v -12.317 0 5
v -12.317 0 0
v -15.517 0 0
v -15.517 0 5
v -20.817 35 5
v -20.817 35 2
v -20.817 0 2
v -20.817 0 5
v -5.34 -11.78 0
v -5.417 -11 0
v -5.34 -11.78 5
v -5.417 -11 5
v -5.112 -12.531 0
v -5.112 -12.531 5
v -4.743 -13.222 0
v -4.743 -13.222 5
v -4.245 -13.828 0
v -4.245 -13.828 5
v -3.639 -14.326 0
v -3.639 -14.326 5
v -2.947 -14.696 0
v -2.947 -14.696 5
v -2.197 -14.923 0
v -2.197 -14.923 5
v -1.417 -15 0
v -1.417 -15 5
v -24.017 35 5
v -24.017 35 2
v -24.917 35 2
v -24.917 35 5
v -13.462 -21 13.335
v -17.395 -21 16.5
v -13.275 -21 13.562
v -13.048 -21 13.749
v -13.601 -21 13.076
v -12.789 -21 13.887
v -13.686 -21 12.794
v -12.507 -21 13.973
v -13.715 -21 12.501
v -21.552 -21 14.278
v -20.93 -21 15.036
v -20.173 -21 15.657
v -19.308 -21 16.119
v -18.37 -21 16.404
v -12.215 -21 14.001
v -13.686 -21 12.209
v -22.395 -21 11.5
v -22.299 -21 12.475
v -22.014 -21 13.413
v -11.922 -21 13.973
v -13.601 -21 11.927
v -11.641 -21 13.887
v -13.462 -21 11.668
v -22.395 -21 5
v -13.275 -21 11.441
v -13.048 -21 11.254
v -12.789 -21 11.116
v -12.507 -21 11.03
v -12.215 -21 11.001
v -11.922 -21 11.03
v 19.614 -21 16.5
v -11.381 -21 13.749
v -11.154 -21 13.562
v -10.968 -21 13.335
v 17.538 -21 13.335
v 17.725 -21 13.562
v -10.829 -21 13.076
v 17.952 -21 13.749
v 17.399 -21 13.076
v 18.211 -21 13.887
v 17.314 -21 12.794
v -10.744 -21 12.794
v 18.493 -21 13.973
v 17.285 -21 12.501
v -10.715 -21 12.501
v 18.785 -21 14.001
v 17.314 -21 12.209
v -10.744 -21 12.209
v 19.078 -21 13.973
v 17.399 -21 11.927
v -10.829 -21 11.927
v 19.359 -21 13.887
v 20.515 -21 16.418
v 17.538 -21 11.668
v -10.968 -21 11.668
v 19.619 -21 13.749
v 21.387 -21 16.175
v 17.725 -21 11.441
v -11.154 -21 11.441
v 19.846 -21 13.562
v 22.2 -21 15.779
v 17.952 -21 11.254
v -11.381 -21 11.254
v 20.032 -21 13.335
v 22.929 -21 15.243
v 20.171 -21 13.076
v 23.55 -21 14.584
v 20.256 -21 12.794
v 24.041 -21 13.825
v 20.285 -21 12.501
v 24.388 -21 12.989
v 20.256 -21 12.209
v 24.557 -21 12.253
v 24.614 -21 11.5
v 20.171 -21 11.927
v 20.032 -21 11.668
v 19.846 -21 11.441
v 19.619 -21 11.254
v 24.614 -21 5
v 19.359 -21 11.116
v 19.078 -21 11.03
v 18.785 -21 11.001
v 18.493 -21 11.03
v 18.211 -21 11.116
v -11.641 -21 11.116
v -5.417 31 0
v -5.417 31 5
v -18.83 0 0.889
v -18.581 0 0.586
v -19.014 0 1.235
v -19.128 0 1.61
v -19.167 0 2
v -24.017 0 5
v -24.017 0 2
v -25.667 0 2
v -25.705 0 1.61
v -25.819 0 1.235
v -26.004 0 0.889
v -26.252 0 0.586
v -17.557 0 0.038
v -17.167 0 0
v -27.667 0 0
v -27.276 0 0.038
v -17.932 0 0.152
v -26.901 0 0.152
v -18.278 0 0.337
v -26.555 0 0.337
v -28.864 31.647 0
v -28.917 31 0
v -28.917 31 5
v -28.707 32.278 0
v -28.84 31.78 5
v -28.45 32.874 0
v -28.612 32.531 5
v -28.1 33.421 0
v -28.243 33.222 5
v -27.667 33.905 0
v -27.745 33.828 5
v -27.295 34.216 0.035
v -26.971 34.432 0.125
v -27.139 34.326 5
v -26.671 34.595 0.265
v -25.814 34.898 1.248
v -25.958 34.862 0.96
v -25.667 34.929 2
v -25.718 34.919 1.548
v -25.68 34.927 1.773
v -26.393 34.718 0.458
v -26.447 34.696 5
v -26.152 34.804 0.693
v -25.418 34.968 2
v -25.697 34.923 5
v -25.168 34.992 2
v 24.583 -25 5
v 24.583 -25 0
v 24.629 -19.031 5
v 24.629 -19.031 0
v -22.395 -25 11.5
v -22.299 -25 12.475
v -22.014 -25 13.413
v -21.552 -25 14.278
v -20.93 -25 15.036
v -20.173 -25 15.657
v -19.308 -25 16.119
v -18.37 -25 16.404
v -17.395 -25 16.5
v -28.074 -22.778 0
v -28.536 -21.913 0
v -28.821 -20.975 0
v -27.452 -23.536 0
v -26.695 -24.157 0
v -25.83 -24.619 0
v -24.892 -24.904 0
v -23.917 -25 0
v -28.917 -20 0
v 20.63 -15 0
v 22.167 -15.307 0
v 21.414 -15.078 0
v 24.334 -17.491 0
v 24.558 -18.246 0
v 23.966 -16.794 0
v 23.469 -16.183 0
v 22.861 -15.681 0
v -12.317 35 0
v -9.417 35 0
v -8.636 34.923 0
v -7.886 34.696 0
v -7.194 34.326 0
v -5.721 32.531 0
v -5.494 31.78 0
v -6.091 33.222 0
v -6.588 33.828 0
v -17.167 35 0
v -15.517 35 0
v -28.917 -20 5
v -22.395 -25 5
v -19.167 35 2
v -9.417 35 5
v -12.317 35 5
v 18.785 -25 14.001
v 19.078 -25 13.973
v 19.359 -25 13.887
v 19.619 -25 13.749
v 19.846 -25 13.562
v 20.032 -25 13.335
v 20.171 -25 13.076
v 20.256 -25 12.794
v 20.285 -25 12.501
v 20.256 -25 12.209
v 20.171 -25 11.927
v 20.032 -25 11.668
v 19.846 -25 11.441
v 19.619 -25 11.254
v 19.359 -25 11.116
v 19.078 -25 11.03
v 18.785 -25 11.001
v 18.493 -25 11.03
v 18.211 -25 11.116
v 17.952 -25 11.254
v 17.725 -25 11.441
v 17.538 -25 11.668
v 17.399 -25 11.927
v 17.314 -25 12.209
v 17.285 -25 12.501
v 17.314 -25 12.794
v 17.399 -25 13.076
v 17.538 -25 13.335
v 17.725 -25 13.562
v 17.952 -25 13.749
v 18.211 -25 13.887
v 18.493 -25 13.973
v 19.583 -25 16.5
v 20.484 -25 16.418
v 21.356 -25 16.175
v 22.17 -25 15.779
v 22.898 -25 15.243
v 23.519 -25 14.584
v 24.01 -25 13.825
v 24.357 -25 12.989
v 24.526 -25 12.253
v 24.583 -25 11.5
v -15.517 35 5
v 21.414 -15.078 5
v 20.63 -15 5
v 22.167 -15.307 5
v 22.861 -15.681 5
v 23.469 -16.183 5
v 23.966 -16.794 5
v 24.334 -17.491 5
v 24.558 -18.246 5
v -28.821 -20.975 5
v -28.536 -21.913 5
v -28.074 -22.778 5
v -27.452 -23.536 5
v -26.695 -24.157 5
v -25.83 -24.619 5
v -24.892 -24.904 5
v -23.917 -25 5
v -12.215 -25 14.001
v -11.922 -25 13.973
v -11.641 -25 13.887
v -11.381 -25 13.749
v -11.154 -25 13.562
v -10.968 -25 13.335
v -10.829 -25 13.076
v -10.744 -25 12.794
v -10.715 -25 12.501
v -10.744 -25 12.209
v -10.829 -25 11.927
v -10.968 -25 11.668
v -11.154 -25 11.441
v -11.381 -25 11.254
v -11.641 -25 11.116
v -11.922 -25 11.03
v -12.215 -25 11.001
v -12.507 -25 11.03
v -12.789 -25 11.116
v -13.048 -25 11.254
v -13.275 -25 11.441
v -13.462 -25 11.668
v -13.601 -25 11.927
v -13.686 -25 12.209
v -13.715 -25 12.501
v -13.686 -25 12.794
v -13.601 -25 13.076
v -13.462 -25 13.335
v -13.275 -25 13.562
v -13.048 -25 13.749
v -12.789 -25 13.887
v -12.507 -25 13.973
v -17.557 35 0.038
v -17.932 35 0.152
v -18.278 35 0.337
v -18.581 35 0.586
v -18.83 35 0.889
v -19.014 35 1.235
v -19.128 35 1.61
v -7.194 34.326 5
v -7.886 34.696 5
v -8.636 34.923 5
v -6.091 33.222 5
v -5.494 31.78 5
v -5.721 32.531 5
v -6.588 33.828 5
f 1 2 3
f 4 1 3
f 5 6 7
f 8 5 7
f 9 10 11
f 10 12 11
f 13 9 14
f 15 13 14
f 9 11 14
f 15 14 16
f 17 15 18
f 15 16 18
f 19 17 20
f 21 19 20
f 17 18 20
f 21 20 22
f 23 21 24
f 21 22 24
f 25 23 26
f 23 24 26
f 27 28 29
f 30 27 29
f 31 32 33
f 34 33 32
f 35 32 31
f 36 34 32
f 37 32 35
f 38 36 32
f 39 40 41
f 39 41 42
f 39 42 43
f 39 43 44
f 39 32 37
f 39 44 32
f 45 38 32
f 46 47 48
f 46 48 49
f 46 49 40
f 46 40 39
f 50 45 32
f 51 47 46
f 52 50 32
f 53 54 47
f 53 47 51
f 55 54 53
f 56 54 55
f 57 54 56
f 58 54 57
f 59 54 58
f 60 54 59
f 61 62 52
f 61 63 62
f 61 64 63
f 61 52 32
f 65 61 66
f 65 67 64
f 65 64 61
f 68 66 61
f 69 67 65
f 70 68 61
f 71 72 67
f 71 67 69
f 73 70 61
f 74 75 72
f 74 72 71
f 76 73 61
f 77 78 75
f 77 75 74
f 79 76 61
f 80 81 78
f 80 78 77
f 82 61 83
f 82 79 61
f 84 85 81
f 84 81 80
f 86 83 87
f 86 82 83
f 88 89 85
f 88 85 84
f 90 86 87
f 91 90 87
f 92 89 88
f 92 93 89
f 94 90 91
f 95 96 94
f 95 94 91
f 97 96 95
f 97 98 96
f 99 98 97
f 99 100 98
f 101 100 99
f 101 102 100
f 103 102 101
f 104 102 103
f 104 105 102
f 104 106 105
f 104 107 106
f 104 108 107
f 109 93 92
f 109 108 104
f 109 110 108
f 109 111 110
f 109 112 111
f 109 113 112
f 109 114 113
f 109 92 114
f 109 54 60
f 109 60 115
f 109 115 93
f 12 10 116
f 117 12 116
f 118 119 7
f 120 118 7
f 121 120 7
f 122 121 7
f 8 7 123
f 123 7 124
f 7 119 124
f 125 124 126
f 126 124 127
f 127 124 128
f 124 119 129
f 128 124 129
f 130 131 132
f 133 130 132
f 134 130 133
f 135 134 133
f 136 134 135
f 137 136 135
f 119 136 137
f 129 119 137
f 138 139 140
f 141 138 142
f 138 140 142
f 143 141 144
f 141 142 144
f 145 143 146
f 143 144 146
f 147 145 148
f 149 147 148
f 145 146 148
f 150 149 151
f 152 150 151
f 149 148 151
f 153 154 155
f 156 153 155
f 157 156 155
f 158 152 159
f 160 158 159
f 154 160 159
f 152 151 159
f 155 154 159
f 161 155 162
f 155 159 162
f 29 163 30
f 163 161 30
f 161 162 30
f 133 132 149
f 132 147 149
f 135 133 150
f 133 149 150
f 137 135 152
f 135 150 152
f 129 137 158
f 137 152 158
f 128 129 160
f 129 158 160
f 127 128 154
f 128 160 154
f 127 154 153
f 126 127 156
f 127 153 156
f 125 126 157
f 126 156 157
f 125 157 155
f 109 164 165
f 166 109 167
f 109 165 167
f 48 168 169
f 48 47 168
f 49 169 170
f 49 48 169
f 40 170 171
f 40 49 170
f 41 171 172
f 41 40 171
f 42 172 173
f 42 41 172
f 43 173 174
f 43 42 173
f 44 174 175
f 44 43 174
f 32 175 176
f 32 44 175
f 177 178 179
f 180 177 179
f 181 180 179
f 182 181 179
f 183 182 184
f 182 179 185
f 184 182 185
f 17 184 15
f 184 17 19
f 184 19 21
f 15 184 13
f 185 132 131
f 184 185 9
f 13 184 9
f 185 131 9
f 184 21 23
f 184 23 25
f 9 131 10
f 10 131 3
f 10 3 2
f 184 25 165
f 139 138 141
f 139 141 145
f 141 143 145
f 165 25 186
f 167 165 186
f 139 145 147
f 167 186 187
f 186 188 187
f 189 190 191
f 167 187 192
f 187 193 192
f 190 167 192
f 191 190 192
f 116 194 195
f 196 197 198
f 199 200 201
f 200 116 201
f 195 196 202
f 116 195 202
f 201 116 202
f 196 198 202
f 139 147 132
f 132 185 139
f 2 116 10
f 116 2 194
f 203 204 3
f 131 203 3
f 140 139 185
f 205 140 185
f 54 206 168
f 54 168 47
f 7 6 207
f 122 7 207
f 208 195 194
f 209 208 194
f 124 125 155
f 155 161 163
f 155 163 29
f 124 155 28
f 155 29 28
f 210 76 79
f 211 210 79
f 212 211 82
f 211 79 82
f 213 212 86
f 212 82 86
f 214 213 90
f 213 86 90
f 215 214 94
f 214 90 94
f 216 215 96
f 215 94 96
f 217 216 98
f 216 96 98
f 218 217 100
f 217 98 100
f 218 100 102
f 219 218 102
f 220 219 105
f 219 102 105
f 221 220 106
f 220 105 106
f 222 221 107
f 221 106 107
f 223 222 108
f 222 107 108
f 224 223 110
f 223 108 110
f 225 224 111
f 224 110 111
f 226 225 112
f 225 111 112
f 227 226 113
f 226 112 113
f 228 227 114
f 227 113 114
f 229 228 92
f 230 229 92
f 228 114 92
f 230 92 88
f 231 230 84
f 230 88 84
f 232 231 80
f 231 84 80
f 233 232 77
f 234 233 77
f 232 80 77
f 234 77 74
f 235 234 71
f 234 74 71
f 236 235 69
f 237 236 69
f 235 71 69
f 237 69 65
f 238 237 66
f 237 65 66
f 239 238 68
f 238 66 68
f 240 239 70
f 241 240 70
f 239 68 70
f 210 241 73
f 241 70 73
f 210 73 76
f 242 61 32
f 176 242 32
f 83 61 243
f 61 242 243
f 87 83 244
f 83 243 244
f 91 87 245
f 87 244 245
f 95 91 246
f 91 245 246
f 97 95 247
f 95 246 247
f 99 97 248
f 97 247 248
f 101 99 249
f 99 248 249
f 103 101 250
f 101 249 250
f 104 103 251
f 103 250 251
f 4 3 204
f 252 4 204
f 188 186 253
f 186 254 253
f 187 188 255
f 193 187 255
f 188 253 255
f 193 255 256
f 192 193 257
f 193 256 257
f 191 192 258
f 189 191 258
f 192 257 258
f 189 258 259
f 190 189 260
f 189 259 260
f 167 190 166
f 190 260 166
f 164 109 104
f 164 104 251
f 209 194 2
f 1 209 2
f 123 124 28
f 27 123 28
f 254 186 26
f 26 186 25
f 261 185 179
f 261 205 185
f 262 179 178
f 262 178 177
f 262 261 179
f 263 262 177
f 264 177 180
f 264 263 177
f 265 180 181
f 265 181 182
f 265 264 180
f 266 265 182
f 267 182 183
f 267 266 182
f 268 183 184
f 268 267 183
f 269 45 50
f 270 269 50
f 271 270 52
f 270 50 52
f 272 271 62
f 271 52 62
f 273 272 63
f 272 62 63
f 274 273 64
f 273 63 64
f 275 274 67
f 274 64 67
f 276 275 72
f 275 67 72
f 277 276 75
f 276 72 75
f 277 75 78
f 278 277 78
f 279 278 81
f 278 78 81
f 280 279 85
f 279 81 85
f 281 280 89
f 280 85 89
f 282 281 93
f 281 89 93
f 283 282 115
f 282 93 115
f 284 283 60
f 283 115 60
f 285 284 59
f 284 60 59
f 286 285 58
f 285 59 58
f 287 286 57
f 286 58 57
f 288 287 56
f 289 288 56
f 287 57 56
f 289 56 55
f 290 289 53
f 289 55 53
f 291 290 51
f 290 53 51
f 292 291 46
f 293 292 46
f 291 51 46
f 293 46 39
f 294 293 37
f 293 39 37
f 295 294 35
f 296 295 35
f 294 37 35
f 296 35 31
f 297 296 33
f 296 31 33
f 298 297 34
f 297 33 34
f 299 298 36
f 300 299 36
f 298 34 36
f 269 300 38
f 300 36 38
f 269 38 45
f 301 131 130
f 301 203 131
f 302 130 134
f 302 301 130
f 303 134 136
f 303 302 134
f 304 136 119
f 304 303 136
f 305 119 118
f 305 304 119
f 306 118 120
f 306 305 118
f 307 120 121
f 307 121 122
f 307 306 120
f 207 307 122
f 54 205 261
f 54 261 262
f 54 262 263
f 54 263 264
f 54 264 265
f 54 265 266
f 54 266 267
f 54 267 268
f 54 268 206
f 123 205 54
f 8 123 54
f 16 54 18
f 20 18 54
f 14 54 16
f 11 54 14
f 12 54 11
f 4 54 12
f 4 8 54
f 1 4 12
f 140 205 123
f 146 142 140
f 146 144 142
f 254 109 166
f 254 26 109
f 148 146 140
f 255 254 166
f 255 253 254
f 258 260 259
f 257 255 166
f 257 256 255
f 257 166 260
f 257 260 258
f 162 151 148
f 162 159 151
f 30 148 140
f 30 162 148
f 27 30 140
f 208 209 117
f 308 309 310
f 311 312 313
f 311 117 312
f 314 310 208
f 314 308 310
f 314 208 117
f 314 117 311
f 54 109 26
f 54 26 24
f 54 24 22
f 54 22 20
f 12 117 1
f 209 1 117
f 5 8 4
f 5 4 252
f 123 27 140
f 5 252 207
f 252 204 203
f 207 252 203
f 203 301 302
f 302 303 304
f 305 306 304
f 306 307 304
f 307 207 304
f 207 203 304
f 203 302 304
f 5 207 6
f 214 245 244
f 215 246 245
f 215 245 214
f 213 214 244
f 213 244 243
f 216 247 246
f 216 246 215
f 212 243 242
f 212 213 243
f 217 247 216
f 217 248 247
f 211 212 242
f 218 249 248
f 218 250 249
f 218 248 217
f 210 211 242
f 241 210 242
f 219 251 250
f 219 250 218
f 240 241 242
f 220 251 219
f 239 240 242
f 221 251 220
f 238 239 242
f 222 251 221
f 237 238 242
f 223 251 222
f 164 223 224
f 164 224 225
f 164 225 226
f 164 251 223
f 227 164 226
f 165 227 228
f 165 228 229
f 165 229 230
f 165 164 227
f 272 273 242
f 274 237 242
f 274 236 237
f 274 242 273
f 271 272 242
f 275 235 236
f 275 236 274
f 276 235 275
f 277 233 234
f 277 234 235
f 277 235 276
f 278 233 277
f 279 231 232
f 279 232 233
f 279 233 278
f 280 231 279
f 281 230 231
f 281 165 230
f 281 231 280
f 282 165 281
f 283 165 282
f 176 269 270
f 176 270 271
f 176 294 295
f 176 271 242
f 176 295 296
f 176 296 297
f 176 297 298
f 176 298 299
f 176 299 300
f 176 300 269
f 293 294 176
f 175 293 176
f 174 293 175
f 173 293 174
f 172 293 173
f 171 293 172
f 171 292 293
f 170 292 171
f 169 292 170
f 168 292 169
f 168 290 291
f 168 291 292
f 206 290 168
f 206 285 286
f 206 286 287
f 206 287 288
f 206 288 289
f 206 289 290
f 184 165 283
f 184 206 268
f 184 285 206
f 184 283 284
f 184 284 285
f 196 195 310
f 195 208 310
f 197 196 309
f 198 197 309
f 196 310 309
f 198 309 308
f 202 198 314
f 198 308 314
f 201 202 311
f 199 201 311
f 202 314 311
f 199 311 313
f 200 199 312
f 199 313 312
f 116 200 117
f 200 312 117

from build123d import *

# Parameters (mm, degrees)
EXTRUDE1_DEPTH = 5
EXTRUDE2_DEPTH = 11.5
SKETCH5_R      = 1.5
EXTRUDE3_DEPTH = 4
FILLET2_R      = 5
FILLET3_R      = 4
FILLET4_R      = 5
SKETCH4_W      = 6.5
SKETCH4_H      = 4
EXTRUDE4_DEPTH = 35
FILLET1_R      = 2


with BuildPart() as part:
    # Sketch1 → Extrude1 (new body)
    with BuildSketch(Plane.XY):
        Polygon((24.583407752, -25), (24.660567061, -15), (-5.416666667, -15), (-5.416666667, 35), (-12.316666667, 35), (-12.316666667, 0), (-15.516666667, 0), (-15.516666667, 35), (-20.816666667, 35), (-20.816666667, 0), (-24.016666667, 0), (-24.016666667, 35), (-28.916666667, 35), (-28.916666667, -25), align=None)
    extrude(amount=EXTRUDE1_DEPTH)

    # Sketch3 → Extrude2 (add)
    with BuildSketch(Plane.XY.offset(5)):
        Polygon((-22.394876452, -21), (24.614271475, -21), (24.583407752, -25), (-22.394876452, -25), align=None)
    extrude(amount=EXTRUDE2_DEPTH)

    # Sketch5 → Extrude3 (cut)
    with BuildSketch(Plane(origin=(0, -21, 0), x_dir=(1, 0, 0), z_dir=(0, 1, 0))):
        with Locations(Location((-12.214752954, -12.501481725, 0), (0, 0, 270))):
            Circle(SKETCH5_R)
        with Locations(Location((18.785247046, -12.501481725, 0), (0, 0, 270))):
            Circle(SKETCH5_R)
    extrude(amount=-EXTRUDE3_DEPTH, mode=Mode.SUBTRACT)

    # Fillet2
    fillet2_edges = [part.edges().sort_by_distance(p)[0] for p in [
        (-22.394876452, -23, 16.5),
        (24.598839614, -23, 16.5),
    ]]
    fillet(fillet2_edges, radius=FILLET2_R)

    # Fillet3
    fillet3_edges = [part.edges().sort_by_distance(p)[0] for p in [
        (-5.416666667, 35, 2.5),
        (-5.416666667, -15, 2.5),
        (24.660567061, -15, 2.5),
        (-28.916666667, 35, 2.5),
    ]]
    fillet(fillet3_edges, radius=FILLET3_R)

    # Fillet4
    fillet4_edges = [part.edges().sort_by_distance(p)[0] for p in [
        (-28.916666667, -25, 2.5),
    ]]
    fillet(fillet4_edges, radius=FILLET4_R)

    # Sketch4 → Extrude4 (cut)
    with BuildSketch(Plane(origin=(0, 35, 0), x_dir=(1, 0, 0), z_dir=(0, 1, 0))):
        with Locations((-22.416666667, 0)):
            Rectangle(SKETCH4_W, SKETCH4_H)
    extrude(amount=-EXTRUDE4_DEPTH, mode=Mode.SUBTRACT)

    # Fillet1
    fillet1_edges = [part.edges().sort_by_distance(p)[0] for p in [
        (-19.166666667, 17.5, 0),
        (-25.666666667, 17.464529206, 0),
    ]]
    fillet(fillet1_edges, radius=FILLET1_R - 0.0001)  # a hair under: the kernel refuses the full size


solid = part.part
